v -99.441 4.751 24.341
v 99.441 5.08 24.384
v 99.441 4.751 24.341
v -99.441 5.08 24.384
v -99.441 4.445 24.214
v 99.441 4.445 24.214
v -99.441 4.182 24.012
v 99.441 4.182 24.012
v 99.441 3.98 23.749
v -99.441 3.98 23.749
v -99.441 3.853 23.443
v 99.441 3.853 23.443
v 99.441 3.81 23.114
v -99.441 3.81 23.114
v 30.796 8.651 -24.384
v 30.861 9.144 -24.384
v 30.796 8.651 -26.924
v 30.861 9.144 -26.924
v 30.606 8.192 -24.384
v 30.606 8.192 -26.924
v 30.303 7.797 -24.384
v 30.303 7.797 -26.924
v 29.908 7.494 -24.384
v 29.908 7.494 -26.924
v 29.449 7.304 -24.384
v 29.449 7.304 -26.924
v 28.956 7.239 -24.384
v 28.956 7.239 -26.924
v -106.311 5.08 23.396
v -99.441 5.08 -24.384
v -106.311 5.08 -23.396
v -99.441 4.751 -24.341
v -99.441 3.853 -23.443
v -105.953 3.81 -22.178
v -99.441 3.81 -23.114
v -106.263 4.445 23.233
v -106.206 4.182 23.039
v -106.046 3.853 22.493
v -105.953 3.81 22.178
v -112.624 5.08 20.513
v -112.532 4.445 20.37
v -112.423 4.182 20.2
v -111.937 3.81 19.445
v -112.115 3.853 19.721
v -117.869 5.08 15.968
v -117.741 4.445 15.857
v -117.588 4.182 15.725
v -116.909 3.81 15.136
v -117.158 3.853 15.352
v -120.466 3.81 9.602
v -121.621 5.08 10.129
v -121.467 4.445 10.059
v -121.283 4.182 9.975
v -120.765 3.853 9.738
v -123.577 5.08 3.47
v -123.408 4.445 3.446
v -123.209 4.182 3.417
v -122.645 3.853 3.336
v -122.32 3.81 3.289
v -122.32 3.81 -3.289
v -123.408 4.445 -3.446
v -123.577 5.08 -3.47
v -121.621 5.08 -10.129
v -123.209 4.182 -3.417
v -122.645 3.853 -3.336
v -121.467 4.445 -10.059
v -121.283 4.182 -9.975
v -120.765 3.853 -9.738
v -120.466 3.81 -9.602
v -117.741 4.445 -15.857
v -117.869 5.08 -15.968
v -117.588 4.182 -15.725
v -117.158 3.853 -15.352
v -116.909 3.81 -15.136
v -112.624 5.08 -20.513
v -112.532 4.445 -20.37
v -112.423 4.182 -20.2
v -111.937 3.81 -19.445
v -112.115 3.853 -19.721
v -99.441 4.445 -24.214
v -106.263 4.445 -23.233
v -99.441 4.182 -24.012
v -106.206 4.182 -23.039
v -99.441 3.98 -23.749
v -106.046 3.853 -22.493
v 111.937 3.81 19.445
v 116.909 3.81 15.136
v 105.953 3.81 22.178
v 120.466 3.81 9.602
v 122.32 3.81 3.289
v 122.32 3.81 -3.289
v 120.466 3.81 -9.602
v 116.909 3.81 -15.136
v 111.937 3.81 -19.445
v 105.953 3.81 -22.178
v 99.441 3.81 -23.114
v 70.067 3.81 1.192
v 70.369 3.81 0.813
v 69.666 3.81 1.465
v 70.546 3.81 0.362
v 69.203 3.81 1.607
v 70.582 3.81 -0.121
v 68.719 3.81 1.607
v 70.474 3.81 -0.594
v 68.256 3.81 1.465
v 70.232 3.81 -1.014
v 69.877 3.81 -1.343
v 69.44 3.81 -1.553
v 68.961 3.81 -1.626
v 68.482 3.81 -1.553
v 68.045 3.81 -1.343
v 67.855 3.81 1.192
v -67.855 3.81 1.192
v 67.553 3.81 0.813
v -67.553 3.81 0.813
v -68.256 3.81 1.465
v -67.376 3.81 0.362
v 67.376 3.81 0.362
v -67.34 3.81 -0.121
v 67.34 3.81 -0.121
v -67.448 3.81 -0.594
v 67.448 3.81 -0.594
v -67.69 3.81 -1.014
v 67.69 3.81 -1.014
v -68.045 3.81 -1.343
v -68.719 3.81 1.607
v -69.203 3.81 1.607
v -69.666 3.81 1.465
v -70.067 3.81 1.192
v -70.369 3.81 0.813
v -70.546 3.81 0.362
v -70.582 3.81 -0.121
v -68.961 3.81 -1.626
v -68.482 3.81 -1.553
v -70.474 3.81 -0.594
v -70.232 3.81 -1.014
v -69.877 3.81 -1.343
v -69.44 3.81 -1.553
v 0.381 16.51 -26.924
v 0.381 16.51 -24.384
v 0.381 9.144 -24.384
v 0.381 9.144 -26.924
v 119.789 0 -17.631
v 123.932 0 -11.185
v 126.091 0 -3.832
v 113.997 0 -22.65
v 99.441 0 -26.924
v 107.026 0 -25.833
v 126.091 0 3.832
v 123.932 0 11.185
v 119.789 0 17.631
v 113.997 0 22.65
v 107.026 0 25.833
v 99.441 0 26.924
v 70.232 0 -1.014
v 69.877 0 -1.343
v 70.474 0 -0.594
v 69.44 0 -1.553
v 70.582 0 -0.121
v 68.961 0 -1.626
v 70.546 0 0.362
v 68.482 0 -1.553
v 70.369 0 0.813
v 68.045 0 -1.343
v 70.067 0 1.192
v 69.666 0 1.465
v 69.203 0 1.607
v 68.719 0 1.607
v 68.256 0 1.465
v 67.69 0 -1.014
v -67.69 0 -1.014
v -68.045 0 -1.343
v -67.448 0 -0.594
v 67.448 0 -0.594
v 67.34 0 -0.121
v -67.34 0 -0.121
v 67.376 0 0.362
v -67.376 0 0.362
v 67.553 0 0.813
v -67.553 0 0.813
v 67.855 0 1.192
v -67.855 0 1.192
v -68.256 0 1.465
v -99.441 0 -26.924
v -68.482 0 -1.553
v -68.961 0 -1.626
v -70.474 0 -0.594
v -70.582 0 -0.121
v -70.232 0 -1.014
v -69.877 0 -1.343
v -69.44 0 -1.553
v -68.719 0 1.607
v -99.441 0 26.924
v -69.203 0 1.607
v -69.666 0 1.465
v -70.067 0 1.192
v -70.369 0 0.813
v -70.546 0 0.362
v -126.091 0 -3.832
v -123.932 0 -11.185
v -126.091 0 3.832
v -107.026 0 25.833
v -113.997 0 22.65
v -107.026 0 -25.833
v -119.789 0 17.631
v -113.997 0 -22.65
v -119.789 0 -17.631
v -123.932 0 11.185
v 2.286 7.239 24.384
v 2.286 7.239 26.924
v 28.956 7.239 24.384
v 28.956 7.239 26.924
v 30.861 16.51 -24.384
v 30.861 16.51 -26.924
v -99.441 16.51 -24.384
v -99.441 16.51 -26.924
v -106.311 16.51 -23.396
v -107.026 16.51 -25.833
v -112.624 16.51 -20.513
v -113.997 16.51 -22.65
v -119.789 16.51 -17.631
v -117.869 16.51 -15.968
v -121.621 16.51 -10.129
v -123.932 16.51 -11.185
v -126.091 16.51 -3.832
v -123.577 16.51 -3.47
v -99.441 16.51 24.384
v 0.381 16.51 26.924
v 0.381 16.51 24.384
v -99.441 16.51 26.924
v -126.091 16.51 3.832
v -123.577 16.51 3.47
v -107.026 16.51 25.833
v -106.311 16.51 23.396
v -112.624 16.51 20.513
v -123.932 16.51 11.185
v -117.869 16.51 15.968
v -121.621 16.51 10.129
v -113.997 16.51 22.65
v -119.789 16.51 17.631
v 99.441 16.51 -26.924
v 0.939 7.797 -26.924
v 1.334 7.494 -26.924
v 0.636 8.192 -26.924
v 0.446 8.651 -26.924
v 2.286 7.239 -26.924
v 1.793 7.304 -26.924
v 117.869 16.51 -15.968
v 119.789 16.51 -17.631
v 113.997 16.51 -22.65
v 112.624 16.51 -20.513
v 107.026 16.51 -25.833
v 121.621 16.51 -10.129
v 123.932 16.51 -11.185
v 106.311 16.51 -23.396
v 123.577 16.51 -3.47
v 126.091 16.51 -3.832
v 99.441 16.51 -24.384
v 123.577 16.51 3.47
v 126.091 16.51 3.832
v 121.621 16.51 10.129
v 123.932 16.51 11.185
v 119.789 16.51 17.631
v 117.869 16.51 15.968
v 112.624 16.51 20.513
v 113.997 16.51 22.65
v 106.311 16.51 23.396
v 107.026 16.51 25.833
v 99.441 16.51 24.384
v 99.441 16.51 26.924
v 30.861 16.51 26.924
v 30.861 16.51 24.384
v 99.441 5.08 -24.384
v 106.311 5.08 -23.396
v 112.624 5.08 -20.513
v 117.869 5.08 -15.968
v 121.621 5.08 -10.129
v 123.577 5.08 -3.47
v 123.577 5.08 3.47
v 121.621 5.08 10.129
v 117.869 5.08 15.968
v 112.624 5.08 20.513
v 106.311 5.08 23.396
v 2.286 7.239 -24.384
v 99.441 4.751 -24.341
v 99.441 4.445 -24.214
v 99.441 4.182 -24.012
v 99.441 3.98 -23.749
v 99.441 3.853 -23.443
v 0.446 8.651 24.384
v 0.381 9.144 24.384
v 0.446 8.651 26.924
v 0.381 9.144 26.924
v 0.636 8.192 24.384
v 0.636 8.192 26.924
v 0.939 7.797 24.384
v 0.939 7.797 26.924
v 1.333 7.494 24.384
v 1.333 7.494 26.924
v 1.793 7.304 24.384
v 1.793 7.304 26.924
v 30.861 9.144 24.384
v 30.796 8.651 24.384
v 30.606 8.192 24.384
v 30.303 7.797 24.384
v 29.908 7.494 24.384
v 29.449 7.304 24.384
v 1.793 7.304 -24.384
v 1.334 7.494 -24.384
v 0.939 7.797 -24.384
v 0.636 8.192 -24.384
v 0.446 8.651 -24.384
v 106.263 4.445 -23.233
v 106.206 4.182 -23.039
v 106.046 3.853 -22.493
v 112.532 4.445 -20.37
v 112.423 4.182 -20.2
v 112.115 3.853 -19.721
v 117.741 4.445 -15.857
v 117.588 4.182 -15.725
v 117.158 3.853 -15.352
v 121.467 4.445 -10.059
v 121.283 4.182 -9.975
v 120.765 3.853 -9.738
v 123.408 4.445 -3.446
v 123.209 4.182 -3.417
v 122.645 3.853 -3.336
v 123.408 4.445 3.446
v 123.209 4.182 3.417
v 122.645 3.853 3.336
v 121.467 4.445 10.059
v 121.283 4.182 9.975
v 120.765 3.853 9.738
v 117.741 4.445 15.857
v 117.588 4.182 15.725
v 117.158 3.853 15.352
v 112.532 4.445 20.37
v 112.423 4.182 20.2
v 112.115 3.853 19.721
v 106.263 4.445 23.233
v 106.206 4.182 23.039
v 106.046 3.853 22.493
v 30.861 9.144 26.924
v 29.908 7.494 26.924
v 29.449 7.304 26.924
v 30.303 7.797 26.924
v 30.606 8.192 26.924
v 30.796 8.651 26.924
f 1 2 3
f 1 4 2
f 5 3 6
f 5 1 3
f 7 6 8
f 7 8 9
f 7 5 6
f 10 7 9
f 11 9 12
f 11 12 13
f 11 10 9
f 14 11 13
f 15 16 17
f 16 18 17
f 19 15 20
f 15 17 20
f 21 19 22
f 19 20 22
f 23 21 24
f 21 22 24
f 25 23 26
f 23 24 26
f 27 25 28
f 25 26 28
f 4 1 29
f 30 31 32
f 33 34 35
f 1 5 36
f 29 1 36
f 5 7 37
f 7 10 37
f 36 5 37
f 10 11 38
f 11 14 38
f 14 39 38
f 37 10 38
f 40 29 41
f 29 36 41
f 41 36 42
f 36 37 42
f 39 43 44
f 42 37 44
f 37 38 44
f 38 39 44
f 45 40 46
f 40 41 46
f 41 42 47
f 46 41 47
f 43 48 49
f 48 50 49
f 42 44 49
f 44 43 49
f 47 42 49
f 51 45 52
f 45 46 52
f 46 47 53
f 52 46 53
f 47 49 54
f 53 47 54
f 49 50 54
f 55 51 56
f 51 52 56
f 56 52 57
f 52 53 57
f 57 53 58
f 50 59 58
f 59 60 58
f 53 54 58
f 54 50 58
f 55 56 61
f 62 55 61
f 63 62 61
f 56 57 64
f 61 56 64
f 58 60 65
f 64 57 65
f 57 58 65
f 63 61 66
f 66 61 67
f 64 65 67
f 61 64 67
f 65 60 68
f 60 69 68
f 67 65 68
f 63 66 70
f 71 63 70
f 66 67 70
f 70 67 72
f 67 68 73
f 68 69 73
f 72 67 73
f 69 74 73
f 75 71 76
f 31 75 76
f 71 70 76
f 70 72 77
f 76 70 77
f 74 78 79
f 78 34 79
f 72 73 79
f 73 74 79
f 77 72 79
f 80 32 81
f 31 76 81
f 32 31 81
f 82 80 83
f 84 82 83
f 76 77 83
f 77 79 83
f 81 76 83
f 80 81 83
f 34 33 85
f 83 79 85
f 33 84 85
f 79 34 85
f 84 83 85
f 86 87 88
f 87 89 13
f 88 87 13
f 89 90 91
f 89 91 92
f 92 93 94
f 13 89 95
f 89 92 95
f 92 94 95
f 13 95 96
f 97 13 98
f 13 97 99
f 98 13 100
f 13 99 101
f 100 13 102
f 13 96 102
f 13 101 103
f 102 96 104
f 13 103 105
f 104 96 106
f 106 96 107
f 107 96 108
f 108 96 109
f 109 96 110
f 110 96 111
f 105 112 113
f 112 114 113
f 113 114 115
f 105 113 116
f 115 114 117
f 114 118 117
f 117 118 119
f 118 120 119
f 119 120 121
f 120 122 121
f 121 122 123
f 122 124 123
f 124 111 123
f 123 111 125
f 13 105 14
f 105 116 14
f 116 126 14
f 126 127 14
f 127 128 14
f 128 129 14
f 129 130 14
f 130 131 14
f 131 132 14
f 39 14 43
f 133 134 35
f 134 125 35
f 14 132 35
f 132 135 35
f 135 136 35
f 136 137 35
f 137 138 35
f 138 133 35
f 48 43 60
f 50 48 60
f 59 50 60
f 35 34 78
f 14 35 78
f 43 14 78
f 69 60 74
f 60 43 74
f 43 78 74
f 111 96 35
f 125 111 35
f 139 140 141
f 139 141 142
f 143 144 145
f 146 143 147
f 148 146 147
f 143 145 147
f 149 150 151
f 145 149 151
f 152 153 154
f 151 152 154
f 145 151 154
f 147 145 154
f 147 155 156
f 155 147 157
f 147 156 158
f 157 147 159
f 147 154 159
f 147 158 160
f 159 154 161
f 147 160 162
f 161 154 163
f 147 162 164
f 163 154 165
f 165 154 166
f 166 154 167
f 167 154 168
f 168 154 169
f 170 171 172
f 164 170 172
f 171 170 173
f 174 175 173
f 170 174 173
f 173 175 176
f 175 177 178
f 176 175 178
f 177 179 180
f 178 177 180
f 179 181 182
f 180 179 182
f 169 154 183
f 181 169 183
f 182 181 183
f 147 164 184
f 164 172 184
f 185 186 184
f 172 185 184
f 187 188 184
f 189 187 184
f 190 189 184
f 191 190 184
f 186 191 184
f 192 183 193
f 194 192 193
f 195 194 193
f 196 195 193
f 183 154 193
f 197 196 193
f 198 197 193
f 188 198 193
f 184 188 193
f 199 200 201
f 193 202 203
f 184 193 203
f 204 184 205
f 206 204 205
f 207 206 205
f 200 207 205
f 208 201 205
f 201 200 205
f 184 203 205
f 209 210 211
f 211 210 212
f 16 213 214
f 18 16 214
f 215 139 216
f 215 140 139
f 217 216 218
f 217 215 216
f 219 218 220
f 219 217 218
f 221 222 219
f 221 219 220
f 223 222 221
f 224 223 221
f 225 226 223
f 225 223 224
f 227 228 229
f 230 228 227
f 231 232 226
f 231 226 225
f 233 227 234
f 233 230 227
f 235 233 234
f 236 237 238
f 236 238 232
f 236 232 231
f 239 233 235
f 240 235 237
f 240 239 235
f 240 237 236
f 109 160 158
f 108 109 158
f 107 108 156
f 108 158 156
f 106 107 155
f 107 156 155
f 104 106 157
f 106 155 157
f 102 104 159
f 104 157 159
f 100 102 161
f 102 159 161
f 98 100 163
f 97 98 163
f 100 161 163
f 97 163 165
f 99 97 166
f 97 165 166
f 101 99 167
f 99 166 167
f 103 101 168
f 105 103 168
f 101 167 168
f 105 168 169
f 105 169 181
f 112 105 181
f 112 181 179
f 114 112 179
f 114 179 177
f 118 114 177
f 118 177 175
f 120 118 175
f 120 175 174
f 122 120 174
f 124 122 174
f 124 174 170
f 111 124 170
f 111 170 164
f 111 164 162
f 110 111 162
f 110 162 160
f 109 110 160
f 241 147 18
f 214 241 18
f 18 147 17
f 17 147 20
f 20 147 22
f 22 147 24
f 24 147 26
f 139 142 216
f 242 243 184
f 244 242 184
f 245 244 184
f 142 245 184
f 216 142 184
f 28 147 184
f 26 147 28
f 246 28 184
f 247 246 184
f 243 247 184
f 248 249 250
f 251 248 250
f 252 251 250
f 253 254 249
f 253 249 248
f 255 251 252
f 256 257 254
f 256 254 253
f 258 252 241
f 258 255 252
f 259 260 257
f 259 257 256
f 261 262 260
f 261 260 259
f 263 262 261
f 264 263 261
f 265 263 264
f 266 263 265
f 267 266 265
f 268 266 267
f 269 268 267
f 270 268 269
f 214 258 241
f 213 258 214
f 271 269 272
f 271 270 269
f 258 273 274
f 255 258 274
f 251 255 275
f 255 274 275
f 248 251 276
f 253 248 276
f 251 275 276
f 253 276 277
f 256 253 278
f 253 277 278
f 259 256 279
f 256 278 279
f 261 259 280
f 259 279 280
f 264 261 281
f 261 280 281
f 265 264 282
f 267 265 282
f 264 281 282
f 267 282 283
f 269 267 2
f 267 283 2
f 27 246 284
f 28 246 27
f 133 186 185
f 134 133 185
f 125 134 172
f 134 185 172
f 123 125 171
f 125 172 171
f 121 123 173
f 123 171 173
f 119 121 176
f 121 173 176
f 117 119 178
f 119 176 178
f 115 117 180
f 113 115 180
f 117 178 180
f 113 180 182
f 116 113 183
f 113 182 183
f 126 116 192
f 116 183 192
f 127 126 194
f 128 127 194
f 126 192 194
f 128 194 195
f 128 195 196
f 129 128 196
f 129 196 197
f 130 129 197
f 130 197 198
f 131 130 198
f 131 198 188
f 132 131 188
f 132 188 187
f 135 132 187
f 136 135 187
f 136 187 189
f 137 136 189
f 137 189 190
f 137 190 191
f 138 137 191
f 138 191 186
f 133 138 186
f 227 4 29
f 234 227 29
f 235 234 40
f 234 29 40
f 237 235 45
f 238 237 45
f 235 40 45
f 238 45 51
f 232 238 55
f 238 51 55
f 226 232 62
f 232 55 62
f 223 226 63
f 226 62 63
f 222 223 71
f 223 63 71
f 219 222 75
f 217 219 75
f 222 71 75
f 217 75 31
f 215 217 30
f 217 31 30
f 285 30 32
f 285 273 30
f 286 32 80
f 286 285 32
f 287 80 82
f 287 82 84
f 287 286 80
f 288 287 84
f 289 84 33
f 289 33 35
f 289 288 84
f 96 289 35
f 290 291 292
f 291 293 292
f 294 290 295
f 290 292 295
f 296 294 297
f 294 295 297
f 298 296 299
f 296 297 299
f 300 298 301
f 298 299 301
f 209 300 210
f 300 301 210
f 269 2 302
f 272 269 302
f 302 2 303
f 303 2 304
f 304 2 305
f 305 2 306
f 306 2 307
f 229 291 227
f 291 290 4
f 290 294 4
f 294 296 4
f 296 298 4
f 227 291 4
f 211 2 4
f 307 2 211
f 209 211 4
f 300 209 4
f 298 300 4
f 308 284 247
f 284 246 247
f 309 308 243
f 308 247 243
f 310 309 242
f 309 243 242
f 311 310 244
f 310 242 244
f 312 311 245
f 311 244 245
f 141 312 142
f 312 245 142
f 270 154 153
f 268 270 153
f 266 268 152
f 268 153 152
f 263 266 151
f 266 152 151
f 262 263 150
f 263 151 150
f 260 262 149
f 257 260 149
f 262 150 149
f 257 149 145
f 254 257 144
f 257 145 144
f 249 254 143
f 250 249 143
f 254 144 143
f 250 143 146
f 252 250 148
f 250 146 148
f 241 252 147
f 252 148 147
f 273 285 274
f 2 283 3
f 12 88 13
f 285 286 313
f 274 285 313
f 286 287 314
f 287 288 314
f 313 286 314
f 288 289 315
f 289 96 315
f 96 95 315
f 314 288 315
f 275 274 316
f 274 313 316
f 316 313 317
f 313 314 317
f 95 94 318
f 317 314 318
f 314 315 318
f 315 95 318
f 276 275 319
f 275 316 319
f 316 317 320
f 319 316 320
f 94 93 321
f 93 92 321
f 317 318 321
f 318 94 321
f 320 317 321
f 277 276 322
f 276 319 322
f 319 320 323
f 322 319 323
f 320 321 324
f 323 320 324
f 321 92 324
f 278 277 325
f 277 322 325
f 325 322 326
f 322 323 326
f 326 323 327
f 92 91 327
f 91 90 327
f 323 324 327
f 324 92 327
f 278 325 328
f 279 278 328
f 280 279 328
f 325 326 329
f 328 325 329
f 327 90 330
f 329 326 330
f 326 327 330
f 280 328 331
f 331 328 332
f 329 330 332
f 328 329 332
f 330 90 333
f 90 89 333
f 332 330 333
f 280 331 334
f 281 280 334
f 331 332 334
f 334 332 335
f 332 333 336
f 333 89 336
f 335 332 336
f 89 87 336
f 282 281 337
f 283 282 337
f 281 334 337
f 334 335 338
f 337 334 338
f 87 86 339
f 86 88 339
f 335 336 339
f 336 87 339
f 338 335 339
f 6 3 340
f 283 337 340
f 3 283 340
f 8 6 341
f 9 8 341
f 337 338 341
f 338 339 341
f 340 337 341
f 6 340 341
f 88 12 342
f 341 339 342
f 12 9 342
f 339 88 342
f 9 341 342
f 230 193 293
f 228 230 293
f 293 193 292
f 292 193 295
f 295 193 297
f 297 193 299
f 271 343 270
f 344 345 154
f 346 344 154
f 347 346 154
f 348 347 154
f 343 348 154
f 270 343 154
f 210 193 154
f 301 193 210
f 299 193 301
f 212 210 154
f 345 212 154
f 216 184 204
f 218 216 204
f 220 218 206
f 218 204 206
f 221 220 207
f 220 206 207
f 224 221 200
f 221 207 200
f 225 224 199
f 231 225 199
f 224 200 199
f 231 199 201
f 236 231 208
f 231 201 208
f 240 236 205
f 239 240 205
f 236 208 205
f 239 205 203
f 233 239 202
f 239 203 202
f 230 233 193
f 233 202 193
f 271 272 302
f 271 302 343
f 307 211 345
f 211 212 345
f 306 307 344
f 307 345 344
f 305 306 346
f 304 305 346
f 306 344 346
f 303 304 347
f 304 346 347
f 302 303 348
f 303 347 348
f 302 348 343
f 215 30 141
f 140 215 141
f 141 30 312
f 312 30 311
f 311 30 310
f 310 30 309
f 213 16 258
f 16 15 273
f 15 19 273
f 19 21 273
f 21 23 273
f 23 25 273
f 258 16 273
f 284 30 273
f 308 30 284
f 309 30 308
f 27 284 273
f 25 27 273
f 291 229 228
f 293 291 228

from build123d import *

# Parameters (mm, degrees)
MAINBLOCK_DEPTH               = 3.81
BOSS_EXTRUDE1_DEPTH           = 16.51
SKETCH3_R                     = 1.6256
CUT_EXTRUDE1_DEPTH            = 131.252044518
FILLET1_R                     = 1.27
SKETCH4_W                     = 30.48
SKETCH4_H                     = 2.54
STABILIZER_MOUNT_CUTOUT_DEPTH = 9.271
FILLET2_R                     = 1.905


with BuildPart() as part:
    # Sketch1 → MainBlock (new body)
    with BuildSketch(Plane(origin=(0, 0, 0), x_dir=(1, 0, 0), z_dir=(0, 1, 0))):
        with BuildLine():
            Line((-99.441, 24.384), (99.441, 24.384))
            ThreePointArc((99.441, 24.384), (123.825, 0), (99.441, -24.384))
            Line((99.441, -24.384), (-99.441, -24.384))
            ThreePointArc((-99.441, -24.384), (-123.825, 0), (-99.441, 24.384))
        make_face()
    extrude(amount=MAINBLOCK_DEPTH)

    # Sketch2 → Boss-Extrude1 (add)
    with BuildSketch(Plane.XZ):
        with BuildLine():
            Line((-99.441, 26.924), (99.441, 26.924))
            ThreePointArc((99.441, 26.924), (126.365, 0), (99.441, -26.924))
            Line((99.441, -26.924), (-99.441, -26.924))
            ThreePointArc((-99.441, -26.924), (-126.365, 0), (-99.441, 26.924))
        make_face()
        with BuildLine():
            Line((99.441, 24.384), (-99.441, 24.384))
            ThreePointArc((-99.441, 24.384), (-123.825, 0), (-99.441, -24.384))
            Line((-99.441, -24.384), (99.441, -24.384))
            ThreePointArc((99.441, -24.384), (123.825, 0), (99.441, 24.384))
        make_face(mode=Mode.SUBTRACT)
    extrude(amount=-BOSS_EXTRUDE1_DEPTH)

    # Sketch3 → Cut-Extrude1 (cut, through all)
    with BuildSketch(Plane.XZ):
        with Locations(Location((-68.961, 0, 0), (0, 0, 270))):
            Circle(SKETCH3_R)
        with Locations(Location((68.961, 0, 0), (0, 0, 270))):
            Circle(SKETCH3_R)
    extrude(amount=-CUT_EXTRUDE1_DEPTH, mode=Mode.SUBTRACT)

    # Fillet1
    fillet1_edges = [part.edges().sort_by_distance(p)[0] for p in [
        (123.825, 3.81, 0),
        (0, 3.81, -24.384),
        (-123.825, 3.81, 0),
        (0, 3.81, 24.384),
    ]]
    fillet(fillet1_edges, radius=FILLET1_R)

    # Sketch4 → Stabilizer-Mount-Cutout (cut)
    with BuildSketch(Plane(origin=(0, 16.51, 0), x_dir=(1, 0, 0), z_dir=(0, 1, 0))):
        with Locations((15.621, 25.654)):
            Rectangle(SKETCH4_W, SKETCH4_H)
    stabilizer_mount_cutout = extrude(amount=-STABILIZER_MOUNT_CUTOUT_DEPTH, mode=Mode.SUBTRACT)

    # Mirror1: Stabilizer-Mount-Cutout across plane
    add(stabilizer_mount_cutout.mirror(Plane.XY), mode=Mode.SUBTRACT)

    # Fillet2
    fillet2_edges = [part.edges().sort_by_distance(p)[0] for p in [
        (30.861, 7.239, -25.654),
        (0.381, 7.239, -25.654),
        (0.381, 7.239, 25.654),
        (30.861, 7.239, 25.654),
    ]]
    fillet(fillet2_edges, radius=FILLET2_R)


solid = part.part
